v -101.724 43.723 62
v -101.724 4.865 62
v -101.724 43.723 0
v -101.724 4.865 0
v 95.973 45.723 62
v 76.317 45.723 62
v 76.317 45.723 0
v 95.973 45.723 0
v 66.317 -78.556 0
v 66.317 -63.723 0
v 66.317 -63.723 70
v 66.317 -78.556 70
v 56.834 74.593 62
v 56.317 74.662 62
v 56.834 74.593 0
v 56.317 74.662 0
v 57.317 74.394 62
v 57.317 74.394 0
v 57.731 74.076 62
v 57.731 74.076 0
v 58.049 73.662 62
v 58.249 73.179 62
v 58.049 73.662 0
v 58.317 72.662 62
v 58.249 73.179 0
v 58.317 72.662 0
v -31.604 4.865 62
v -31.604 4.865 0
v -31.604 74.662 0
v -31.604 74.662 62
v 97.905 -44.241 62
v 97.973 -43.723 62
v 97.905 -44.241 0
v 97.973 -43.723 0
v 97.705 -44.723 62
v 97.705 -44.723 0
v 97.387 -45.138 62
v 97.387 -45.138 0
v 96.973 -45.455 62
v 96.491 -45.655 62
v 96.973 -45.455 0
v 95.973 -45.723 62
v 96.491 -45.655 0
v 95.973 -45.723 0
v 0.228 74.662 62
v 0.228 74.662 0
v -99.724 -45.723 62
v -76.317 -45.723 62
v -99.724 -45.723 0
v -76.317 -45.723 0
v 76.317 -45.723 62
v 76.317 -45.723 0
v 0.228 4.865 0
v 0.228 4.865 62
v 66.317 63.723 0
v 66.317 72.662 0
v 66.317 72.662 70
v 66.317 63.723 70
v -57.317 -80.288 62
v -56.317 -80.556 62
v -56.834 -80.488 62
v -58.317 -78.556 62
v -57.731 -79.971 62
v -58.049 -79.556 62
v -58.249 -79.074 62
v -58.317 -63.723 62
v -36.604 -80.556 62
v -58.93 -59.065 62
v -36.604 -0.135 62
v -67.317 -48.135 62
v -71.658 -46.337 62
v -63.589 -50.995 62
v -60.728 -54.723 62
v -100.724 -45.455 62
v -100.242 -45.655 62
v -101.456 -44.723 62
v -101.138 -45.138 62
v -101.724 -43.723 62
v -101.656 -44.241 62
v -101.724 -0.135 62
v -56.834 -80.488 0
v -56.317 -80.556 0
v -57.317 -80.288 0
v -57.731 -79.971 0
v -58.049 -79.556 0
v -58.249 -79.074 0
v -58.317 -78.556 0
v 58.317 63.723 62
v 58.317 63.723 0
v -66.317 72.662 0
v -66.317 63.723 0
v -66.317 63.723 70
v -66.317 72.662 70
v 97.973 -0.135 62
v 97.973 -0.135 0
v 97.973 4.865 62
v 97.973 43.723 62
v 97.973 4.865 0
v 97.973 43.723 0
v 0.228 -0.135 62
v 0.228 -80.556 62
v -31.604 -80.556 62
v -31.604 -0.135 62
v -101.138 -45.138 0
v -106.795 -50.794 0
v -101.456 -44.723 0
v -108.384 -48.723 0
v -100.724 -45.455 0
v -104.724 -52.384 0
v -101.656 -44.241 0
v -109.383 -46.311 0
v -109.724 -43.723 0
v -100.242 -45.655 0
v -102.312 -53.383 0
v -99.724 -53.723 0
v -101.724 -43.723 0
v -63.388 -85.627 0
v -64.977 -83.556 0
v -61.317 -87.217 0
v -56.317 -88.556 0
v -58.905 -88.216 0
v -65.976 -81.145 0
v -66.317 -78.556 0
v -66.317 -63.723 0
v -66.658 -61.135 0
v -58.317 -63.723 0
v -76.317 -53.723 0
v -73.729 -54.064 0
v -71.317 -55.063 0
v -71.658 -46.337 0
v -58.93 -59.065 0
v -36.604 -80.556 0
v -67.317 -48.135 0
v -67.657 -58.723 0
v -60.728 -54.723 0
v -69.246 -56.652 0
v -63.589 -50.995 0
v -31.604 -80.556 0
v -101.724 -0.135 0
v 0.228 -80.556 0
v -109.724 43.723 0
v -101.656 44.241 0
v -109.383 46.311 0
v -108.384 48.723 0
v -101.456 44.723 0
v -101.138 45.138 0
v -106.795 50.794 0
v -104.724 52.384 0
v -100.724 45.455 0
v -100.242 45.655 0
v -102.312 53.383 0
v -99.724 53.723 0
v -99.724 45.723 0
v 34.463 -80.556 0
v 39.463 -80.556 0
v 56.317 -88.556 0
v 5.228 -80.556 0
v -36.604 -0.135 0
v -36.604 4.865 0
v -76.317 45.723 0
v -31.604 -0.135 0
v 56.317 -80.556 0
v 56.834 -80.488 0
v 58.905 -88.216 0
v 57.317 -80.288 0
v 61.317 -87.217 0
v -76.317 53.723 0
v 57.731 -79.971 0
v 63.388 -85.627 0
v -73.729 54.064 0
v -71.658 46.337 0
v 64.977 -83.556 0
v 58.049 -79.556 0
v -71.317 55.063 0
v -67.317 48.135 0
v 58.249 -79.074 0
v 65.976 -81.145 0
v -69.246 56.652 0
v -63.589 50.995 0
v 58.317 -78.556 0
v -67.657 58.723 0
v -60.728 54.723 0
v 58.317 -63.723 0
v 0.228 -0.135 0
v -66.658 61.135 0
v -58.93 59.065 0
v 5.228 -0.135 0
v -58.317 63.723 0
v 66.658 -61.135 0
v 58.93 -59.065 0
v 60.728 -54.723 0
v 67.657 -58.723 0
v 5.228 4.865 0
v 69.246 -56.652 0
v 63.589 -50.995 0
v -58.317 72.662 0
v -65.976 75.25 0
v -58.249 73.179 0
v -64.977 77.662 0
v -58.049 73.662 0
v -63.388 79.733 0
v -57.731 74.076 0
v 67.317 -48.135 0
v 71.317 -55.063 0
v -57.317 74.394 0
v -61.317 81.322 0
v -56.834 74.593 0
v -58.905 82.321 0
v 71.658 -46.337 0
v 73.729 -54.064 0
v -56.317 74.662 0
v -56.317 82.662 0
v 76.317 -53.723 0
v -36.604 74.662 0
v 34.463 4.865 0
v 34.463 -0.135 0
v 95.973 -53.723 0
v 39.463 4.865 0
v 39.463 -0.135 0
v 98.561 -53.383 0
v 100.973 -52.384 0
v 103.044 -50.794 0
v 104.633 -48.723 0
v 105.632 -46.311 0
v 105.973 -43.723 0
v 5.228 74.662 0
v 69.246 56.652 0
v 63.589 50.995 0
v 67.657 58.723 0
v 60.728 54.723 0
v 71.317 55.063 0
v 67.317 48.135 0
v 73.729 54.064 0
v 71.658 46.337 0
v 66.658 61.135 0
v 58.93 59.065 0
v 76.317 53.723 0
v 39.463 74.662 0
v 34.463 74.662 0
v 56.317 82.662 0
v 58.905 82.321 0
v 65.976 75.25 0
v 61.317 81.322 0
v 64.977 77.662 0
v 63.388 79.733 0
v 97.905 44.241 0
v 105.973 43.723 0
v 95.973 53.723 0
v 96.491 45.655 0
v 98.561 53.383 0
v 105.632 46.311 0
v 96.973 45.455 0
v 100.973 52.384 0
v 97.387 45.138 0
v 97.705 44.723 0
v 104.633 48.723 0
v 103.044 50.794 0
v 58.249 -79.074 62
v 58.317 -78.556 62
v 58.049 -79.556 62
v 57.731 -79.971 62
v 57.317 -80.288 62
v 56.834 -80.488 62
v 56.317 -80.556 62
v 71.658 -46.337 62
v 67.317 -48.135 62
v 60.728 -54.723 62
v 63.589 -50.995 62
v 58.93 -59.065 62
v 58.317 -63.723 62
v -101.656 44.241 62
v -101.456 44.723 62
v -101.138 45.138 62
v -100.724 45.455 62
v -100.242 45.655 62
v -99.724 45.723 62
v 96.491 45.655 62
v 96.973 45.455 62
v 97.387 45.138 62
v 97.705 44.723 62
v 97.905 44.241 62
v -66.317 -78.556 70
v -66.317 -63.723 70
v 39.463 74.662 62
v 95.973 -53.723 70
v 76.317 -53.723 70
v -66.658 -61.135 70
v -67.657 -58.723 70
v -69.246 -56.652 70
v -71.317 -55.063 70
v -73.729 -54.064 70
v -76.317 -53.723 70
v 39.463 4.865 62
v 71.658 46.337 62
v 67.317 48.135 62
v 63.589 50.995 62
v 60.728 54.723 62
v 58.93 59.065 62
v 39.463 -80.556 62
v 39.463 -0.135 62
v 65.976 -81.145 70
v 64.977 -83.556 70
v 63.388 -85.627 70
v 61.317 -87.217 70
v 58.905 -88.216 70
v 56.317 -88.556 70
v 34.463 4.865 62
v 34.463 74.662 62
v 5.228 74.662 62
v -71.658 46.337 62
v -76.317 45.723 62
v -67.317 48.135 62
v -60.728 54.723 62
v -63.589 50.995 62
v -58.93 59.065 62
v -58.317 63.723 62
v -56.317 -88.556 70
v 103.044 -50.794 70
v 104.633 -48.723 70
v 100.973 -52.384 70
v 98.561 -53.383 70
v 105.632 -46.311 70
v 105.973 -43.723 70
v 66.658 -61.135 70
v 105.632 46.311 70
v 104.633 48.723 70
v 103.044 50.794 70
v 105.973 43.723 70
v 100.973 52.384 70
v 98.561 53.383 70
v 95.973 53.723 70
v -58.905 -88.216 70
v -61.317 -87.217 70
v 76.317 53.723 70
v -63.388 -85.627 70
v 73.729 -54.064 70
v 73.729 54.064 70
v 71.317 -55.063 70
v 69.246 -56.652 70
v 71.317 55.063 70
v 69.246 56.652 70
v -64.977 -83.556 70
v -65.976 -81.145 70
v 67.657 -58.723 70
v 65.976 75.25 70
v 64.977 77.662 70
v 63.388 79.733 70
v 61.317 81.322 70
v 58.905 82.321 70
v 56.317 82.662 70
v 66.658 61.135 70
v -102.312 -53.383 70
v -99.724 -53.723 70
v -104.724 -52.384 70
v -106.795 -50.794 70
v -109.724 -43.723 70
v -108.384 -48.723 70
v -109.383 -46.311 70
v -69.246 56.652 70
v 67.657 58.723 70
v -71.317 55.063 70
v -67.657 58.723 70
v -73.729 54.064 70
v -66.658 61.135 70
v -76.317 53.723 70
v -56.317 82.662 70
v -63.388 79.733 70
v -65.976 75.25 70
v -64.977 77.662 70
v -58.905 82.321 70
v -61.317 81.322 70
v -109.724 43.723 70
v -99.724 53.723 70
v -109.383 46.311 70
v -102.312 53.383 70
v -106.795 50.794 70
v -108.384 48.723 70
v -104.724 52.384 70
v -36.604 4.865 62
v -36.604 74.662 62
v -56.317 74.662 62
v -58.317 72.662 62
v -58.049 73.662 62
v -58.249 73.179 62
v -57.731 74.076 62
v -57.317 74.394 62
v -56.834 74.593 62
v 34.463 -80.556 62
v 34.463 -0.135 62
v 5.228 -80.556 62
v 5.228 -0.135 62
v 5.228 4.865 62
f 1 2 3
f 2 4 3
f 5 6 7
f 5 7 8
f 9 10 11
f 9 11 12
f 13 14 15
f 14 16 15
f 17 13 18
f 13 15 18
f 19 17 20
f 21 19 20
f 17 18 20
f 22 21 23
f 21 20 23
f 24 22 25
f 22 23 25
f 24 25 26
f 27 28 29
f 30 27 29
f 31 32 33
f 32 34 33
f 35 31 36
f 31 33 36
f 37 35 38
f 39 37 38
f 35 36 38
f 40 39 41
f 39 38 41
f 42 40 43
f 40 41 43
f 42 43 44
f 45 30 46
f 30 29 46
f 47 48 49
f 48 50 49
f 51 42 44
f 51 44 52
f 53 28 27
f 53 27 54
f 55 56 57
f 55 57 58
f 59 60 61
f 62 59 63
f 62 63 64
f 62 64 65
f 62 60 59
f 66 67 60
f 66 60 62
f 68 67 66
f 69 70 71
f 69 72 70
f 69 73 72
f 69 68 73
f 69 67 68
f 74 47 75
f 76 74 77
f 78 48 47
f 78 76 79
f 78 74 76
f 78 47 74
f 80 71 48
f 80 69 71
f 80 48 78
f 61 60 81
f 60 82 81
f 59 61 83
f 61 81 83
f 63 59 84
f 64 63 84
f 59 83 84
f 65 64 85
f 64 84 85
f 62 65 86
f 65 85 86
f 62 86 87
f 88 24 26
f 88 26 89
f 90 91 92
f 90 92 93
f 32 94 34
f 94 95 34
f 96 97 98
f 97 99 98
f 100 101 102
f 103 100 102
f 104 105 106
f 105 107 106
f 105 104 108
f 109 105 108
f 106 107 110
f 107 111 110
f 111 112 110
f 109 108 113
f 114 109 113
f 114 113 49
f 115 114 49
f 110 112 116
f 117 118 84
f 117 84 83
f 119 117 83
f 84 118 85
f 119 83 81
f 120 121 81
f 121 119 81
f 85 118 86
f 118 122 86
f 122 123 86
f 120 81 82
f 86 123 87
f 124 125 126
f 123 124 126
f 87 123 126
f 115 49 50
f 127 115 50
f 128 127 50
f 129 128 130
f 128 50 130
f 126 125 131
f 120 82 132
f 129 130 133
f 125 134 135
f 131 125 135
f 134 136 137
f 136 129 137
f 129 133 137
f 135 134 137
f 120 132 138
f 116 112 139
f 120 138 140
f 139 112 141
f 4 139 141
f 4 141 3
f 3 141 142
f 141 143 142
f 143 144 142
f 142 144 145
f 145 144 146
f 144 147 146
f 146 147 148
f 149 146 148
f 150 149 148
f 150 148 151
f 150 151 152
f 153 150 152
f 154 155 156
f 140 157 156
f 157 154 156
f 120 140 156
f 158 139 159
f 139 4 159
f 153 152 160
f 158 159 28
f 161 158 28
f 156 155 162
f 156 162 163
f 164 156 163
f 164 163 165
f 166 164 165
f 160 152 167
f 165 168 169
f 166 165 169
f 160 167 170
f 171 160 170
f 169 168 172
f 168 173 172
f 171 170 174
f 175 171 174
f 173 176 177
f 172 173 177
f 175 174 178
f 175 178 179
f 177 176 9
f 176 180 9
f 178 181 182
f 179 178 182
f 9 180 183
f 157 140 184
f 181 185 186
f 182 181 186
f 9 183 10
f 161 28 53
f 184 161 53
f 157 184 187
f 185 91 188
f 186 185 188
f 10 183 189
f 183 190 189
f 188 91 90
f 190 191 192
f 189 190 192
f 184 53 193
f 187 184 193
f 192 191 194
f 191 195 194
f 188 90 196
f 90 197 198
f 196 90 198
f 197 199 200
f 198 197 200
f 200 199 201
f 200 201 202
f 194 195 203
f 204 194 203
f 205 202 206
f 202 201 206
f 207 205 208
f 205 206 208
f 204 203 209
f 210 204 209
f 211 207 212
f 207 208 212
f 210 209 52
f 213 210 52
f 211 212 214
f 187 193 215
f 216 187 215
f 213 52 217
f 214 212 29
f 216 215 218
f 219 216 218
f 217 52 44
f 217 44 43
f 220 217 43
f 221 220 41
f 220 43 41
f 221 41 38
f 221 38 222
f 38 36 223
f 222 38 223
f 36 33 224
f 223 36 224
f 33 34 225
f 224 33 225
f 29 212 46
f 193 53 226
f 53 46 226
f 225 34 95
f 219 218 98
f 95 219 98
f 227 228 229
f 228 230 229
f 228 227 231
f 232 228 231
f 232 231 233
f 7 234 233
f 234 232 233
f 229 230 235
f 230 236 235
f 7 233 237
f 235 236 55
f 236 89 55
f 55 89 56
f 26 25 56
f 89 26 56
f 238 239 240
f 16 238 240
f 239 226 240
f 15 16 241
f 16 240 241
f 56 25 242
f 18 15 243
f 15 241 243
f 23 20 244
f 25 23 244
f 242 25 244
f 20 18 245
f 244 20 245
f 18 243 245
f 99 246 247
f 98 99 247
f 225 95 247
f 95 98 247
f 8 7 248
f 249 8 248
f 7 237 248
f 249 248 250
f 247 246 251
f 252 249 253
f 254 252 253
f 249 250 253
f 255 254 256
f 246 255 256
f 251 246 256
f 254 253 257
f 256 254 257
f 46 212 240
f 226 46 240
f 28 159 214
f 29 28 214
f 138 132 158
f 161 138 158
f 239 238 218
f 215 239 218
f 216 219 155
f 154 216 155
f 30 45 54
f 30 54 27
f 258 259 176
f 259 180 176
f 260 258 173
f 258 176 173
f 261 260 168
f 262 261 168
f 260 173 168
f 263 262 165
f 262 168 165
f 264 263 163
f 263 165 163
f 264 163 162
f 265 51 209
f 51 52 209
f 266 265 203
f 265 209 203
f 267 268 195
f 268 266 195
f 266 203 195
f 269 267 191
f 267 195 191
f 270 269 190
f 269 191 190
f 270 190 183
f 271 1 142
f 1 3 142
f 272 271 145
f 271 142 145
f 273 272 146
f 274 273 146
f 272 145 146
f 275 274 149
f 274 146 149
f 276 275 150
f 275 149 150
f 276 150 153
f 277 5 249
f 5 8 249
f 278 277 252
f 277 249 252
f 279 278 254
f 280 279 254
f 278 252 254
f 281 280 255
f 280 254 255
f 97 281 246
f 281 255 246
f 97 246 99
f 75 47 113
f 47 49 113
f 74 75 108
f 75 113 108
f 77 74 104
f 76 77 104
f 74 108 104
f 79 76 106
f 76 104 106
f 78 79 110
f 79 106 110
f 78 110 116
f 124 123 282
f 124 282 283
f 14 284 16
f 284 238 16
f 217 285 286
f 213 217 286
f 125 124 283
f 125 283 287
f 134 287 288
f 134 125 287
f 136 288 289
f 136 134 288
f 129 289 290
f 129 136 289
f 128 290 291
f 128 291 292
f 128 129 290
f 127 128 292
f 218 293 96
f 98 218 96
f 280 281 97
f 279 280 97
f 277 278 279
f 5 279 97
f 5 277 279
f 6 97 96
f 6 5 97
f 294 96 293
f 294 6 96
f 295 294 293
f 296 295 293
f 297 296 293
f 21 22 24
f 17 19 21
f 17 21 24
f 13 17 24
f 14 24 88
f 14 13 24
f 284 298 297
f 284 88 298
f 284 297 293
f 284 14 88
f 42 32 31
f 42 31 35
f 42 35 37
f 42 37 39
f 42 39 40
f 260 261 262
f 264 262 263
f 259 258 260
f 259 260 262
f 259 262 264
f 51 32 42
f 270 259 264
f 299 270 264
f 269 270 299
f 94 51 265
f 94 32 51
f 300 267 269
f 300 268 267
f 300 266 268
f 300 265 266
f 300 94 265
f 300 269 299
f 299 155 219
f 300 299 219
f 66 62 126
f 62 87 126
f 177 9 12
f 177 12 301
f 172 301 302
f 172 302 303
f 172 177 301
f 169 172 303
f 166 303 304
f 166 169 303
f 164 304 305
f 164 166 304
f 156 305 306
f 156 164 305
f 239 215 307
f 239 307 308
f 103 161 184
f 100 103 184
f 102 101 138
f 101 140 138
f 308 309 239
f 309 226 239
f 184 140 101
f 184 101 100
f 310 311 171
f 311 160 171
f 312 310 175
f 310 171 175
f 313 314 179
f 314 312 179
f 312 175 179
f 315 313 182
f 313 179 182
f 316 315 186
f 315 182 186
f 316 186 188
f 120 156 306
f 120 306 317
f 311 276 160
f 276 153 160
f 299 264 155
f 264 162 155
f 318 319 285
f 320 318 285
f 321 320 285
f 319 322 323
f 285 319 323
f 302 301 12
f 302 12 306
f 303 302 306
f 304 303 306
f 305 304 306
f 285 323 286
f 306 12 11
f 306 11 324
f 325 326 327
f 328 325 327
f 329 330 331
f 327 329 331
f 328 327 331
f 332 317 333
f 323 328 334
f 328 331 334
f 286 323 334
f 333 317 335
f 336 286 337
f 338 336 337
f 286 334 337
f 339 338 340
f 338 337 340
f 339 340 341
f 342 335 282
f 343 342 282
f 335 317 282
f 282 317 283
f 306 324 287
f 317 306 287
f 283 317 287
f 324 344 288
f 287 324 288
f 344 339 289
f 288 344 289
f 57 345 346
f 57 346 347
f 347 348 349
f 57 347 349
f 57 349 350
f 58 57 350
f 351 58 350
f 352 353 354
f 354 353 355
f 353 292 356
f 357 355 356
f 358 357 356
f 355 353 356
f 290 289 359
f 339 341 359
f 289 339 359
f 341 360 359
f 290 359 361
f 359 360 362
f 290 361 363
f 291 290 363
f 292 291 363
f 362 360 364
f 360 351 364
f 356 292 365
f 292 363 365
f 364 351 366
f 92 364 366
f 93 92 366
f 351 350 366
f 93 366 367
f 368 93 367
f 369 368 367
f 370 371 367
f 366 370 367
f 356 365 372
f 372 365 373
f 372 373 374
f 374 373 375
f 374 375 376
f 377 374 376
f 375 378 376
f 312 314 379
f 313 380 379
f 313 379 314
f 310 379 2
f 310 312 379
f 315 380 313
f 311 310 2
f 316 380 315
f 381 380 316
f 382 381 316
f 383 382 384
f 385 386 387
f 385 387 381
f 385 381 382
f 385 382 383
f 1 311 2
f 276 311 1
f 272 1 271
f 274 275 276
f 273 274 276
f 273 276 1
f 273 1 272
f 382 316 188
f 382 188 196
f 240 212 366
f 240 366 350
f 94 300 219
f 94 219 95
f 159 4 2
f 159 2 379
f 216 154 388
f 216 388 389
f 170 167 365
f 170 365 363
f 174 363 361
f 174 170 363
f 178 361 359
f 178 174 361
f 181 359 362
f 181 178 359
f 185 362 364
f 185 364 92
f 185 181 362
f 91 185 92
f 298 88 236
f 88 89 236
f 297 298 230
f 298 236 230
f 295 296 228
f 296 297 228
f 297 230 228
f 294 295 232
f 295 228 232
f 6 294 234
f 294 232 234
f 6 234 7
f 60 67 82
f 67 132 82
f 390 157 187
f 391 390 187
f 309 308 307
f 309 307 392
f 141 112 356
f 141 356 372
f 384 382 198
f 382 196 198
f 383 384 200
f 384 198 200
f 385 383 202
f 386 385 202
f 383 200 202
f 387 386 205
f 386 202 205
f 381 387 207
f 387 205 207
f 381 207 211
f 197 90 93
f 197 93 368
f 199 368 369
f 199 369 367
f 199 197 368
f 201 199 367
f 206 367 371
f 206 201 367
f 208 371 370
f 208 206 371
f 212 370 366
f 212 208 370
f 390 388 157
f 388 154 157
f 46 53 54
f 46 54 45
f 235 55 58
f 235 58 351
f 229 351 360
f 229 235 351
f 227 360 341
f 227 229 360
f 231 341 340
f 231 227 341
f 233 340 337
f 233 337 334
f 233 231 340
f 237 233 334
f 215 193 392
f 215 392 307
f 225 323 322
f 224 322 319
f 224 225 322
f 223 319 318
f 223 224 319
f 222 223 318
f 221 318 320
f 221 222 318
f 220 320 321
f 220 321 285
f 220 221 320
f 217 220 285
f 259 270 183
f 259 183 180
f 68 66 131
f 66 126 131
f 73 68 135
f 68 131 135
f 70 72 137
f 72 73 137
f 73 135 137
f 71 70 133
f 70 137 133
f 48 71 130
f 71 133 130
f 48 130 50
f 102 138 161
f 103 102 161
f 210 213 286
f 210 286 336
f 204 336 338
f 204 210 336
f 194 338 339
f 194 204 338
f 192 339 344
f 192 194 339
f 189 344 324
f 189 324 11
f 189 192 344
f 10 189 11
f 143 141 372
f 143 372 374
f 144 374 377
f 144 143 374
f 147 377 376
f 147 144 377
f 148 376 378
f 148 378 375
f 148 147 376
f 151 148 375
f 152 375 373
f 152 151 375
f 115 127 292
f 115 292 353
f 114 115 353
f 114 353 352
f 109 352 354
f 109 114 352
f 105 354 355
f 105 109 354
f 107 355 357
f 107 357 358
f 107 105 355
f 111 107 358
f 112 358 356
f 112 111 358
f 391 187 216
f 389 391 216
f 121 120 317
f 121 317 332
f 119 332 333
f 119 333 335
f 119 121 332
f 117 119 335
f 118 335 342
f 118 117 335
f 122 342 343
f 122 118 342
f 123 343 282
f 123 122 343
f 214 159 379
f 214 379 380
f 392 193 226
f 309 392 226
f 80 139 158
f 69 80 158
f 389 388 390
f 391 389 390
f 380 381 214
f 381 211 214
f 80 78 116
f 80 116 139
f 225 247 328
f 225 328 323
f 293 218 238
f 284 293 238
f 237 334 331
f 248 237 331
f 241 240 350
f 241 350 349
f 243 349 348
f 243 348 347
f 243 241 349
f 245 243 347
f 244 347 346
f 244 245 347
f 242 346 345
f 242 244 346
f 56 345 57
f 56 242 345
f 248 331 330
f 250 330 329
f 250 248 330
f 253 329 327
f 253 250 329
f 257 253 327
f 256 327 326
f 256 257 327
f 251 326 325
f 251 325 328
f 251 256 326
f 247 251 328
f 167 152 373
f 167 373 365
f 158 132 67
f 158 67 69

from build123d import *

# Parameters (mm, degrees)
BOSS_EXTRUDE1_DEPTH = 70
SHELL1_T            = -8
RIB15_REACH         = 159.422
SKETCH3_WALLS_W     = 5
SKETCH3_WALLS_H     = 472.061491267
SKETCH3_WALLS_W_2   = 516.540635297
SKETCH3_WALLS_H_2   = 5


with BuildPart() as part:
    # Sketch1 → Boss-Extrude1 (new body)
    with BuildSketch(Plane.XY):
        with BuildLine():
            Line((76.31679607, 53.723303483), (95.972900387, 53.723303483))
            ThreePointArc((95.972900387, 53.723303483), (103.043968199, 50.794371295), (105.972900387, 43.723303483))
            Line((105.972900387, 43.723303483), (105.972900387, -43.723303483))
            ThreePointArc((105.972900387, -43.723303483), (103.043968199, -50.794371295), (95.972900387, -53.723303483))
            Line((95.972900387, -53.723303483), (76.31679607, -53.723303483))
            ThreePointArc((76.31679607, -53.723303483), (69.245728258, -56.652235671), (66.31679607, -63.723303483))
            Line((66.31679607, -63.723303483), (66.31679607, -78.556368085))
            ThreePointArc((66.31679607, -78.556368085), (63.387863882, -85.627435897), (56.31679607, -88.556368085))
            Line((56.31679607, -88.556368085), (-56.31679607, -88.556368085))
            ThreePointArc((-56.31679607, -88.556368085), (-63.387863882, -85.627435897), (-66.31679607, -78.556368085))
            Line((-66.31679607, -78.556368085), (-66.31679607, -63.723303483))
            ThreePointArc((-66.31679607, -63.723303483), (-69.245728258, -56.652235671), (-76.31679607, -53.723303483))
            Line((-76.31679607, -53.723303483), (-99.724153498, -53.723303483))
            ThreePointArc((-99.724153498, -53.723303483), (-106.79522131, -50.794371295), (-109.724153498, -43.723303483))
            Line((-109.724153498, -43.723303483), (-109.724153498, 43.723303483))
            ThreePointArc((-109.724153498, 43.723303483), (-106.79522131, 50.794371295), (-99.724153498, 53.723303483))
            Line((-99.724153498, 53.723303483), (-76.31679607, 53.723303483))
            ThreePointArc((-76.31679607, 53.723303483), (-69.245728258, 56.652235671), (-66.31679607, 63.723303483))
            Line((-66.31679607, 63.723303483), (-66.31679607, 72.661541768))
            ThreePointArc((-66.31679607, 72.661541768), (-63.387863882, 79.73260958), (-56.31679607, 82.661541768))
            Line((-56.31679607, 82.661541768), (56.31679607, 82.661541768))
            ThreePointArc((56.31679607, 82.661541768), (63.387863882, 79.73260958), (66.31679607, 72.661541768))
            Line((66.31679607, 72.661541768), (66.31679607, 63.723303483))
            ThreePointArc((66.31679607, 63.723303483), (69.245728258, 56.652235671), (76.31679607, 53.723303483))
        make_face()
    extrude(amount=BOSS_EXTRUDE1_DEPTH)

    # Shell1
    shell1_openings = [part.faces().sort_by_distance(p)[0] for p in [
        (-1.372763961, -2.113601646, 0),
    ]]
    offset(amount=SHELL1_T, openings=shell1_openings, kind=Kind.INTERSECTION)

    # Sketch3 walls → Rib15 (add, up to next)
    with BuildSketch(Plane.XY, mode=Mode.PRIVATE) as rib15_sk1:
        with Locations((-34.103750382, -2.947413158)):
            Rectangle(SKETCH3_WALLS_W, SKETCH3_WALLS_H)
    rib15_tool1 = extrude(rib15_sk1.sketch, amount=RIB15_REACH, mode=Mode.PRIVATE) - part.part
    # Sketch3 walls → Rib15 (add, up to next)
    with BuildSketch(Plane.XY, mode=Mode.PRIVATE) as rib15_sk2:
        with Locations((2.728391134, -2.947413158)):
            Rectangle(SKETCH3_WALLS_W, SKETCH3_WALLS_H)
    rib15_tool2 = extrude(rib15_sk2.sketch, amount=RIB15_REACH, mode=Mode.PRIVATE) - part.part
    # Sketch3 walls → Rib15 (add, up to next)
    with BuildSketch(Plane.XY, mode=Mode.PRIVATE) as rib15_sk3:
        with Locations((36.963394466, -2.947413158)):
            Rectangle(SKETCH3_WALLS_W, SKETCH3_WALLS_H)
    rib15_tool3 = extrude(rib15_sk3.sketch, amount=RIB15_REACH, mode=Mode.PRIVATE) - part.part
    # Sketch3 walls → Rib15 (add, up to next)
    with BuildSketch(Plane.XY, mode=Mode.PRIVATE) as rib15_sk4:
        with Locations((-1.875626555, 2.364914945)):
            Rectangle(SKETCH3_WALLS_W_2, SKETCH3_WALLS_H_2)
    rib15_tool4 = extrude(rib15_sk4.sketch, amount=RIB15_REACH, mode=Mode.PRIVATE) - part.part
    add(rib15_tool1.solids().sort_by_distance((-34.103750382, -2.947413159, 0))[0])
    add(rib15_tool2.solids().sort_by_distance((2.728391134, -2.947413159, 0))[0])
    add(rib15_tool3.solids().sort_by_distance((36.963394466, -2.947413159, 0))[0])
    add(rib15_tool4.solids().sort_by_distance((-1.875626556, 2.364914945, 0))[0])


solid = part.part
